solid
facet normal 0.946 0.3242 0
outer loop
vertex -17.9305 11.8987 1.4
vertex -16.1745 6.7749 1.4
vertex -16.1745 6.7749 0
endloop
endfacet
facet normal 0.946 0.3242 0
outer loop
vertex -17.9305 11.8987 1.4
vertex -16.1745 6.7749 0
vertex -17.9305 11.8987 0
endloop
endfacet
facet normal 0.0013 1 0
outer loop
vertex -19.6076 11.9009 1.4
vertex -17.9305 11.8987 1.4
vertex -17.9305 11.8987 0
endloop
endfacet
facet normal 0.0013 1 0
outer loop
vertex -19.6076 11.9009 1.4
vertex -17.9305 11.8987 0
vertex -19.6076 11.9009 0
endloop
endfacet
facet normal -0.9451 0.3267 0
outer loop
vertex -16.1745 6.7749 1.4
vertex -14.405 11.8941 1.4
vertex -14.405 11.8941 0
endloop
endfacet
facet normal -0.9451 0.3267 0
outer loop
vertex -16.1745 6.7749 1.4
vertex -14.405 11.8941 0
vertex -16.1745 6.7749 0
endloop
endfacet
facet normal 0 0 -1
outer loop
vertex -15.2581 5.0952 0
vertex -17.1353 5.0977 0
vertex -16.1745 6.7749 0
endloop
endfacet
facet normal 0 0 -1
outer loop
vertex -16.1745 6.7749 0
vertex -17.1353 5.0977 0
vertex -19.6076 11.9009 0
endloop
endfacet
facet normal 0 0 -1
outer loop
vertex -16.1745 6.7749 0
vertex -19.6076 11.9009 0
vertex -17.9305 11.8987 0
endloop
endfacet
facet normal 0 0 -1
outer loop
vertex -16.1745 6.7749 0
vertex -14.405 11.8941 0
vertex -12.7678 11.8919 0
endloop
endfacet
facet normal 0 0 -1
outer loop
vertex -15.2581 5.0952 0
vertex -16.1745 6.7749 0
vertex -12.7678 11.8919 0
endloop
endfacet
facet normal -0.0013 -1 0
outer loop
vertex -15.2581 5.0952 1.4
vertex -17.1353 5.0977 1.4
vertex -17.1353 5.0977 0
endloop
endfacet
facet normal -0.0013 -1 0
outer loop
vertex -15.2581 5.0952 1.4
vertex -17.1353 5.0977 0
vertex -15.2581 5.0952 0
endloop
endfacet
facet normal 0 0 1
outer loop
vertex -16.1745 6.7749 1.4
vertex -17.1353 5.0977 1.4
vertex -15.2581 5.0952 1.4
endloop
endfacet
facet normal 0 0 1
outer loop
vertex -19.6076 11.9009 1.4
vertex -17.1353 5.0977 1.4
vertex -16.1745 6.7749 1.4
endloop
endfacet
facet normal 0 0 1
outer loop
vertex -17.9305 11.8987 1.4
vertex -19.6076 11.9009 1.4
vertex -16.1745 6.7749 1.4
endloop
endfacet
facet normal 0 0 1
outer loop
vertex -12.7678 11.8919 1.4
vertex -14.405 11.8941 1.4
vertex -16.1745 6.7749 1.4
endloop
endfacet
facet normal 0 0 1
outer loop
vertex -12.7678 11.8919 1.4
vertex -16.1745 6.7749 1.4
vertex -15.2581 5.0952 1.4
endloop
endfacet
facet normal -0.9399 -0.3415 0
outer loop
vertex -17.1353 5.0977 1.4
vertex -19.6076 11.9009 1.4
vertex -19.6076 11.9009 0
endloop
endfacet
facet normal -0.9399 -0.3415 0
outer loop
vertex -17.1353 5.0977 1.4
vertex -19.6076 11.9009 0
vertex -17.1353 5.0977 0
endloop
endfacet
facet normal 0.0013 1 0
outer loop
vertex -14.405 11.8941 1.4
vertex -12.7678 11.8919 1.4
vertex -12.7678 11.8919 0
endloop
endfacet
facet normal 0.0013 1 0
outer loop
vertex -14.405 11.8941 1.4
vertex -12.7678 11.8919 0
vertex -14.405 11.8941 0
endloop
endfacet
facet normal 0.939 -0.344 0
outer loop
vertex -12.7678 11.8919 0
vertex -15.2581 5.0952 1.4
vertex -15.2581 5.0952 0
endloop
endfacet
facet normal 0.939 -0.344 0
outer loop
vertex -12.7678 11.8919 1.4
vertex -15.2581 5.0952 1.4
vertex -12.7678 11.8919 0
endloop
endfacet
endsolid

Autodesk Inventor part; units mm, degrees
ref_plane "YZ Plane" through (0, 0, 0) normal (1, 0, 0) x (0, 1, 0)
ref_plane "XZ Plane" through (0, 0, 0) normal (0, 1, 0) x (-1, 0, 0)
ref_plane "XY Plane" through (0, 0, 0) normal (0, 0, 1) x (1, 0, 0)
sketch "Sketch1" plane through (0, 0, 0) normal (0, 0, 1) x (1, 0, 0)
  line L0 (-20, -20) -> (20, -20)
  line L1 (20, -20) -> (20, 20)
  line L2 (20, 20) -> (-20, 20)
  line L3 (-20, 20) -> (-20, -20)
  line L4 (-20, 0) -> (20, 0) construction
  line L5 (0, -28) -> (0, 28) construction
  line L6 (-28, 0) -> (28, 0) construction
  point P0 (0, 0)
  dimension "d0" = 40
extrude "Extrusion1" add sketch "Sketch1" along normal blind 1.4
sketch "Sketch2" plane through (0, 0, 1.4) normal (0, 0, 1) x (1, 0, 0)
  line L0 (20, -20) -> (20, 20) projected
  line L1 (20, 20) -> (-20, 20) projected
  line L2 (-20, 20) -> (-20, -20) projected
  line L3 (-20, -20) -> (20, -20) projected
  line L4 (-17.2054, 4.9978) -> (-19.7504, 12.0011) construction
  line L5 (-19.7504, 12.0011) -> (-17.859, 11.9986) construction
  line L6 (-17.859, 11.9986) -> (-16.1741, 7.0821) construction
  line L7 (-16.1741, 7.0821) -> (-14.4762, 11.9942) construction
  line L8 (-14.4762, 11.9942) -> (-12.6247, 11.9918) construction
  line L9 (-12.6247, 11.9918) -> (-15.1882, 4.9951) construction
  line L10 (-15.1882, 4.9951) -> (-17.2054, 4.9978) construction
  line L11 (-16.1745, 6.7749) -> (-17.9305, 11.8987)
  line L12 (-17.9305, 11.8987) -> (-19.6076, 11.9009)
  line L13 (-19.6076, 11.9009) -> (-17.1353, 5.0977)
  line L14 (-17.1353, 5.0977) -> (-15.2581, 5.0952)
  line L15 (-15.2581, 5.0952) -> (-12.7678, 11.8919)
  line L16 (-12.7678, 11.8919) -> (-14.405, 11.8941)
  line L17 (-14.405, 11.8941) -> (-16.1745, 6.7749)
  point P0 (0, 0)
  dimension "d3" = 0.1
extrude "Extrusion2" cut sketch "Sketch2" against normal up to next
properties part number "V_letter"
